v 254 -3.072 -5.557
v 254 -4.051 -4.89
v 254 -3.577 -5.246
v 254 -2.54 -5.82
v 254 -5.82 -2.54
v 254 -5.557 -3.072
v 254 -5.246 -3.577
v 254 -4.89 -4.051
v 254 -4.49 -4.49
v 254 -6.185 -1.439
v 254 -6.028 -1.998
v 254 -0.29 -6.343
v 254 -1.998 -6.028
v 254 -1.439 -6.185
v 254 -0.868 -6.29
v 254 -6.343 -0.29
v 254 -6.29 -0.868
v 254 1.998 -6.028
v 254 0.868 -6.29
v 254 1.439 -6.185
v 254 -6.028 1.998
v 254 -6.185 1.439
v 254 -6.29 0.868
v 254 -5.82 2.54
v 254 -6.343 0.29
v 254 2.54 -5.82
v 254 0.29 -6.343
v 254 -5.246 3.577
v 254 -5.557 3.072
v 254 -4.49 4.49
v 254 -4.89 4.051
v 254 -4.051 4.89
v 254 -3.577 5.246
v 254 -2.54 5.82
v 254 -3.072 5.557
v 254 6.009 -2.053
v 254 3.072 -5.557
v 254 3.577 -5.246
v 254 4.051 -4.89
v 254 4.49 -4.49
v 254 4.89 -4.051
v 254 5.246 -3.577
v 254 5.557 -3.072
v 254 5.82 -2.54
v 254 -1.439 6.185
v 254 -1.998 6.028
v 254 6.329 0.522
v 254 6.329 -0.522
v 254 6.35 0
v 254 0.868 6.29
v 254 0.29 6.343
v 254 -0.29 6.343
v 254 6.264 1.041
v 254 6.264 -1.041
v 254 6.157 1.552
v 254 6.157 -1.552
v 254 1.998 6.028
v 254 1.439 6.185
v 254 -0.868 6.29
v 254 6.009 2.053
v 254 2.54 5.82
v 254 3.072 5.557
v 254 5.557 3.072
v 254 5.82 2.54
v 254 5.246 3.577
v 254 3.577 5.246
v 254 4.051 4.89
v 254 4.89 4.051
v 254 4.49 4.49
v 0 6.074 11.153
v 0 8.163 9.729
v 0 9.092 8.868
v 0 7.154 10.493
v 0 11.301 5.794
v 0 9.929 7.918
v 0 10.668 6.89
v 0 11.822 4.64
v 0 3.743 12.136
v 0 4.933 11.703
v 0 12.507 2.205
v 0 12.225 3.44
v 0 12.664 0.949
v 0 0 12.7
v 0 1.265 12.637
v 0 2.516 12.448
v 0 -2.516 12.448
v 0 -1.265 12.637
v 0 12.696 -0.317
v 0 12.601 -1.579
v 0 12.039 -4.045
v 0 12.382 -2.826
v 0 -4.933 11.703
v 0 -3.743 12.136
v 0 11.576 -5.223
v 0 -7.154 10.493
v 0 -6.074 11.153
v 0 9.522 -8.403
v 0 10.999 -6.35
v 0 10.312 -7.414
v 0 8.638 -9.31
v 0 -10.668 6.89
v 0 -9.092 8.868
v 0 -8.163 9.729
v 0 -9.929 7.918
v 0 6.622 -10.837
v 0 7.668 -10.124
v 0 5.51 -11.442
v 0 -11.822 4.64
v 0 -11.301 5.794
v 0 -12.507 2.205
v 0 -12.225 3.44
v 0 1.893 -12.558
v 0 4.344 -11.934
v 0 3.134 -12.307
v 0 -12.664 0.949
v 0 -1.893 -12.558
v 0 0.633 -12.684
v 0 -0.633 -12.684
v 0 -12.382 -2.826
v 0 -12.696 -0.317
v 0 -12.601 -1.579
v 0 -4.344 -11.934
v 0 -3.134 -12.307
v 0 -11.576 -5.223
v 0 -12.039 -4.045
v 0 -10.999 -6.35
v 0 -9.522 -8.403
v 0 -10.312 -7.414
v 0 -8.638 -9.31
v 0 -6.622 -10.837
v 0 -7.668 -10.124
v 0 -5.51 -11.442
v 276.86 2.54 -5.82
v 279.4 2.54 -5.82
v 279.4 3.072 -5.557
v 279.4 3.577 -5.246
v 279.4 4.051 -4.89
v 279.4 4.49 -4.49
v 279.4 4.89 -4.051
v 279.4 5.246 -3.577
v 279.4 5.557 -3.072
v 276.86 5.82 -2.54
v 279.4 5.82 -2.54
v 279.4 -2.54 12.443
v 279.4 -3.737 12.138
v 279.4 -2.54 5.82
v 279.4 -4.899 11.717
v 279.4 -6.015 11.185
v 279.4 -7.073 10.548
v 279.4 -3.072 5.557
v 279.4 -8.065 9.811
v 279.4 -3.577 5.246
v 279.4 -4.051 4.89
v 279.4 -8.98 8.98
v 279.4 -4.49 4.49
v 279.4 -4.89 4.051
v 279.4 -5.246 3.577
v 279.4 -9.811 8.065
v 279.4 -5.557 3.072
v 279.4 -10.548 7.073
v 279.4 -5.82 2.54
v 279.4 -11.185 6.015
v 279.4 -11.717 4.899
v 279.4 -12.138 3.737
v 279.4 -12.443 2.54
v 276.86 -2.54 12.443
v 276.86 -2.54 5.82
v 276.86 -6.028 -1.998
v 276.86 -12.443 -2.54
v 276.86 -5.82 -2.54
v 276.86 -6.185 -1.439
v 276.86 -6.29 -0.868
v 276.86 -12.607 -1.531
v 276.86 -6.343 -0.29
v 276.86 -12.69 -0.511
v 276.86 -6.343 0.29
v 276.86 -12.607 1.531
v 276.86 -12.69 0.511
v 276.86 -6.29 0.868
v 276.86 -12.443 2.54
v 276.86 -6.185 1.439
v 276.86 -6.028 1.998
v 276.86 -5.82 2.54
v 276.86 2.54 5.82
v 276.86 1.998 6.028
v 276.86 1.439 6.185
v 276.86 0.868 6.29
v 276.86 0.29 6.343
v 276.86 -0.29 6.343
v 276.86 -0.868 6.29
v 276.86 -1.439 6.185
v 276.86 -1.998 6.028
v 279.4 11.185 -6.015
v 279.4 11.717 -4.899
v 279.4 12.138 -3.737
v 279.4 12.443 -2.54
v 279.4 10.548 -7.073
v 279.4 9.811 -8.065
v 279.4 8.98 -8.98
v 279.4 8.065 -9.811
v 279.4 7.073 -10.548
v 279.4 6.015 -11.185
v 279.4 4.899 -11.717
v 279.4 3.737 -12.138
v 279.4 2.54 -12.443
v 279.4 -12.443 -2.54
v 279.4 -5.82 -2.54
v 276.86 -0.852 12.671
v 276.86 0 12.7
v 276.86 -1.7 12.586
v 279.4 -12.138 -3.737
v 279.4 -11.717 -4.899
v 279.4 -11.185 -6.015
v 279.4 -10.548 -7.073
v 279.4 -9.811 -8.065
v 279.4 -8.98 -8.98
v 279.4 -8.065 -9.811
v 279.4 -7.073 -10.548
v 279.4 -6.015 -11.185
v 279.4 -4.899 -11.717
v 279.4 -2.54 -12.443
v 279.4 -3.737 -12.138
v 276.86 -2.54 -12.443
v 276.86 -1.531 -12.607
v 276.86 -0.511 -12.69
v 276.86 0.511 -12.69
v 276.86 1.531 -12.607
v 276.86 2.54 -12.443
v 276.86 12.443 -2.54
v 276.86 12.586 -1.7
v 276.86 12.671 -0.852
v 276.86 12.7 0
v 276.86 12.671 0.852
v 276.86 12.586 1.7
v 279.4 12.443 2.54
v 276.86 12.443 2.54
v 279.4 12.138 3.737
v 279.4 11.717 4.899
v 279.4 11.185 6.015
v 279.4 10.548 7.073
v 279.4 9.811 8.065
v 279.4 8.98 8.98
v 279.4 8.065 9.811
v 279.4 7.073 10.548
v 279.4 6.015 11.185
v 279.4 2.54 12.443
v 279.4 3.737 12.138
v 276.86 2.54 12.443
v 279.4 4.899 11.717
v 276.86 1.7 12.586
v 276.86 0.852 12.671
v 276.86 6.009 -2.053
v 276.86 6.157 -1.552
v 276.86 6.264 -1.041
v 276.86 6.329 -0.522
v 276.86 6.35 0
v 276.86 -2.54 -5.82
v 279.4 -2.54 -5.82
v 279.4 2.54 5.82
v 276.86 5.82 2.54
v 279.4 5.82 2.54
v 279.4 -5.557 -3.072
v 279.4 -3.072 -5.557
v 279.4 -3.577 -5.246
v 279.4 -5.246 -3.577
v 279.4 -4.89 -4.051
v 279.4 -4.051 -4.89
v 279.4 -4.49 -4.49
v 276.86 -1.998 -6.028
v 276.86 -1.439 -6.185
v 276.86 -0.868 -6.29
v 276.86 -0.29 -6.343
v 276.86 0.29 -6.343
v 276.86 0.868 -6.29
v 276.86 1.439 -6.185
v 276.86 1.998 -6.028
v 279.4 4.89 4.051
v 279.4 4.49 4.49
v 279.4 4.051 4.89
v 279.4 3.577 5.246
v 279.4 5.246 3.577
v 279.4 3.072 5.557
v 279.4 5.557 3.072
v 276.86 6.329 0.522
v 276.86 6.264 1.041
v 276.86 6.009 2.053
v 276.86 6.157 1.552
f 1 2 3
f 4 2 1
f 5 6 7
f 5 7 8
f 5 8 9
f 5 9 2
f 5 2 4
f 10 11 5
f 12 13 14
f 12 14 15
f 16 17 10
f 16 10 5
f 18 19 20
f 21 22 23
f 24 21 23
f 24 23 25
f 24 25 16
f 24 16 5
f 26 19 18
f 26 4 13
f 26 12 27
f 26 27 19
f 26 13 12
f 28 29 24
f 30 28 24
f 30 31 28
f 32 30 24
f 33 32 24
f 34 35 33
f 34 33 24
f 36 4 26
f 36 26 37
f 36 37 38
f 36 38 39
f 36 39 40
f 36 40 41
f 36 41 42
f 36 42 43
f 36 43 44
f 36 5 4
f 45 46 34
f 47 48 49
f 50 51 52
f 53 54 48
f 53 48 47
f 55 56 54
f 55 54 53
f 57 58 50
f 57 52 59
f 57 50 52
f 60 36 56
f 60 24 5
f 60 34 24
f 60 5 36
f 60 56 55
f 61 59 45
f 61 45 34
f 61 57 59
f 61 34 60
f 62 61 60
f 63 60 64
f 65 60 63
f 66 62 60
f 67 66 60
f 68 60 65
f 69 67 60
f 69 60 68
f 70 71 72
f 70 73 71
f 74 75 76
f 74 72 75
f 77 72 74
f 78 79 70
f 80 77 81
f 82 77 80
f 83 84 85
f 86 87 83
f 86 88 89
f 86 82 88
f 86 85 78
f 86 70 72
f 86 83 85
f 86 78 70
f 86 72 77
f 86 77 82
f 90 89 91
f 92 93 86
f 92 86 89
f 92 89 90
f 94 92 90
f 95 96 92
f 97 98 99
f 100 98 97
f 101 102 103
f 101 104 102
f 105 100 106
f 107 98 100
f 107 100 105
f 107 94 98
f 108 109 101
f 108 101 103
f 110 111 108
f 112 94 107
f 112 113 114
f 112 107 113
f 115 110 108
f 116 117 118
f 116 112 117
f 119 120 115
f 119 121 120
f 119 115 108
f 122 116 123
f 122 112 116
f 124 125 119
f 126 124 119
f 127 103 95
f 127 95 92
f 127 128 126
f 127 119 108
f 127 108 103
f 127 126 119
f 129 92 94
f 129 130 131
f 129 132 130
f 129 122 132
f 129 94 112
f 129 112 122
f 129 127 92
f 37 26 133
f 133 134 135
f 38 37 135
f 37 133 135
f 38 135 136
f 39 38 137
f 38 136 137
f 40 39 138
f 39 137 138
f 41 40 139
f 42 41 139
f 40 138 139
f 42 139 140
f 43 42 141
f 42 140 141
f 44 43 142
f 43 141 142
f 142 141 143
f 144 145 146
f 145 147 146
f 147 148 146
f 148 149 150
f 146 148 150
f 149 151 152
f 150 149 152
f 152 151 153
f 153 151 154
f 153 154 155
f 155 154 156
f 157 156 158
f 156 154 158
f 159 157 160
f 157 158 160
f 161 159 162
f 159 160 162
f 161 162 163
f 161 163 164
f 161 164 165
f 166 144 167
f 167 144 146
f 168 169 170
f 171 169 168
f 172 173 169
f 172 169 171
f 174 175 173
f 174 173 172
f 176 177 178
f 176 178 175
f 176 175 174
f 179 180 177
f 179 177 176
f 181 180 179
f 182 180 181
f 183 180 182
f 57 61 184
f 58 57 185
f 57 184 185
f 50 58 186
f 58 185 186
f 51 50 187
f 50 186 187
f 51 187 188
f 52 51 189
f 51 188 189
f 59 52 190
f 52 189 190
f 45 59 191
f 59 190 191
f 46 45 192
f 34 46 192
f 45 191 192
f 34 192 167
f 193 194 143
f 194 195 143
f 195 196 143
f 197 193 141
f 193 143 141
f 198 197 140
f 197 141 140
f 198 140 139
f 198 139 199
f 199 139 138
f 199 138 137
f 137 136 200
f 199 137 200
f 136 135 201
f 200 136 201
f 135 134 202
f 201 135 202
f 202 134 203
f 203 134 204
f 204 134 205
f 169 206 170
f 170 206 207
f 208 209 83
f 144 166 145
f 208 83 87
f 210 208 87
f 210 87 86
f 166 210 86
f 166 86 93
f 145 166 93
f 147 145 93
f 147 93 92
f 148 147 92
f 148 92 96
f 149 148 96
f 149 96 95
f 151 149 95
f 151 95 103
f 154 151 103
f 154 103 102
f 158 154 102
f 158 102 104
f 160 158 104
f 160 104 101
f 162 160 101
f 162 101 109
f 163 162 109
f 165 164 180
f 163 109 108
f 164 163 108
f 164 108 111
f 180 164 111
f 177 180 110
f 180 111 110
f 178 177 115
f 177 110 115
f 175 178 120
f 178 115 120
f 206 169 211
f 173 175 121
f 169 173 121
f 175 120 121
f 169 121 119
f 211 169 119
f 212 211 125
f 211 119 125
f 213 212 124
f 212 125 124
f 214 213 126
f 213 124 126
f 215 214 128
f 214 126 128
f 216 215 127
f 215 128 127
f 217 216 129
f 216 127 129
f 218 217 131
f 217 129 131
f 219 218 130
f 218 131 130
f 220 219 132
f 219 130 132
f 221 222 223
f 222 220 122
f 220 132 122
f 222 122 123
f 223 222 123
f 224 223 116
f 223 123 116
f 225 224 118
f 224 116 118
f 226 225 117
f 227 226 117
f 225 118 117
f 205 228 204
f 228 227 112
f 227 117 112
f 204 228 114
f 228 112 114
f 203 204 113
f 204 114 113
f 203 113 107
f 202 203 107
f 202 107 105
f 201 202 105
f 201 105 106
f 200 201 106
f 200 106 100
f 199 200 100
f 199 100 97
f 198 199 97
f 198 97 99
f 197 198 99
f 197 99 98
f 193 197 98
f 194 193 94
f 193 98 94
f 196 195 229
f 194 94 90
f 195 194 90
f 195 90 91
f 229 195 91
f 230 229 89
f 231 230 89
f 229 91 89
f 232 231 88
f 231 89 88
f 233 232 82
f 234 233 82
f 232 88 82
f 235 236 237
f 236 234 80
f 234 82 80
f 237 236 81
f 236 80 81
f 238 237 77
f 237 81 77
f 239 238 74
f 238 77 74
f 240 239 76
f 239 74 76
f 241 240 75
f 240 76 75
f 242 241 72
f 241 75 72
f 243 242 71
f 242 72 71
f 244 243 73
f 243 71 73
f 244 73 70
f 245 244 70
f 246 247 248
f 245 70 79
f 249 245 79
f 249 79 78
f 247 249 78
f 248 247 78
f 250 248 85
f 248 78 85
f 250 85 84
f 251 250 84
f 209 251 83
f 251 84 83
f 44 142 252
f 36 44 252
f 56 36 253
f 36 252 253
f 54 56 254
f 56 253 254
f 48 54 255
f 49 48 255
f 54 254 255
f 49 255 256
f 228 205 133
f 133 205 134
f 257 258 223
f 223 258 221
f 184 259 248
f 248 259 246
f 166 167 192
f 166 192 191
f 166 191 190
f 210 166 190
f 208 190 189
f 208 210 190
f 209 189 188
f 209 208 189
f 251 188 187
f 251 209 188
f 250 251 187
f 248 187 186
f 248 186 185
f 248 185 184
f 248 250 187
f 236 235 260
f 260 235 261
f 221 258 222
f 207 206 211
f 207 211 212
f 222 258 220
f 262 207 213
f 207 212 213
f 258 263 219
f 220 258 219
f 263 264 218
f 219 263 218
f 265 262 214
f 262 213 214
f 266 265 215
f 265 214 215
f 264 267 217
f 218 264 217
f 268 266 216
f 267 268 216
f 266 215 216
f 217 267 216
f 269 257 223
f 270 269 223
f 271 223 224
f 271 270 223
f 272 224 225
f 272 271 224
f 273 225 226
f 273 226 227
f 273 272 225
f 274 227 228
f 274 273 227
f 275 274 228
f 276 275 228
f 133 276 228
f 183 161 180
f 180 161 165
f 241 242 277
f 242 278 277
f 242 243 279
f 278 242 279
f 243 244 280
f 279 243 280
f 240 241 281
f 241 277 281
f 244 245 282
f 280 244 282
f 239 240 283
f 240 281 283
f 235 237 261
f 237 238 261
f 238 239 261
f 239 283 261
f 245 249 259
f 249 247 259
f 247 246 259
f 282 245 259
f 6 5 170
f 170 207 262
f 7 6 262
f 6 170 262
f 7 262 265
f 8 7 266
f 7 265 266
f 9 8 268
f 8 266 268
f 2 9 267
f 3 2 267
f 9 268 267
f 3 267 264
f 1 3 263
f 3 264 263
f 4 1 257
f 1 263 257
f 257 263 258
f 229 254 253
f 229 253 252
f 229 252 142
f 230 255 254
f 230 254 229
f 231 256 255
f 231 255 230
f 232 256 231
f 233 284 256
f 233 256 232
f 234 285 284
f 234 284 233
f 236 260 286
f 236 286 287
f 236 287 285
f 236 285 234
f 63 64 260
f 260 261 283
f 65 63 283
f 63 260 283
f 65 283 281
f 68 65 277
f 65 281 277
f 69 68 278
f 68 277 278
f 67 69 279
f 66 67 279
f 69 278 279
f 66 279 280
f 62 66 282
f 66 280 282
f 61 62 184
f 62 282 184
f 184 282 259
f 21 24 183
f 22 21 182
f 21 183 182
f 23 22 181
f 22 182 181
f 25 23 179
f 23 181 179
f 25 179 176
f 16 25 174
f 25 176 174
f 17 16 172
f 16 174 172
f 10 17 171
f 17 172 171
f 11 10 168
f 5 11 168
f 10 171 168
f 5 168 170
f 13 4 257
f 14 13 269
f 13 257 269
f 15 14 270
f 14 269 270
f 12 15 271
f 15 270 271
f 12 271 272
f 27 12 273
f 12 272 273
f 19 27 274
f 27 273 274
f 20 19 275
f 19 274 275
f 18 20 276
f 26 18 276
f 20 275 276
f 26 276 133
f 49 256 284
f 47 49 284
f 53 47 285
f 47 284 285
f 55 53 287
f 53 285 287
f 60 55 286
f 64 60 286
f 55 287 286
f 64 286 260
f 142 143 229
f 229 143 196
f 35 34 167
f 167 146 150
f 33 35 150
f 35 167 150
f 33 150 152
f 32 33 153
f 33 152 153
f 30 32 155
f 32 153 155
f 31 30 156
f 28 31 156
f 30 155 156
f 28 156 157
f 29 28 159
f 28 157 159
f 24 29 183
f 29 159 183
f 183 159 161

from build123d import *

# Parameters (mm, degrees)
F0_W     = 66.167
F0_H     = 12.7
F0_W_2   = 194.183
F0_W_3   = 19.05
F3_DEPTH = 2.54
F4_DEPTH = 25.4


with BuildPart() as f1:
    # F0 (on Front) → F1 (revolve)
    with BuildSketch(Plane.XZ):
        with Locations((33.0835, 6.35)):
            Rectangle(F0_W, F0_H)
        with Locations((163.2585, 6.35)):
            Rectangle(F0_W_2, F0_H)
        with Locations((269.875, 6.35)):
            Rectangle(F0_W_3, F0_H)
    revolve(axis=Axis((155.896521, 0, 0), (1, 0, 0)))

    # F2 (on face) → F3 (cut)
    with BuildSketch(Plane.YZ.offset(279.4)):
        with BuildLine():
            ThreePointArc((-2.54, 5.819871), (0, 6.35), (2.54, 5.819871))
            Line((2.54, 5.819871), (2.54, 12.443408))
            ThreePointArc((2.54, 12.443408), (0, 12.7), (-2.54, 12.443408))
            Line((-2.54, 12.443408), (-2.54, 5.819871))
        make_face()
        with BuildLine():
            ThreePointArc((-5.819871, -2.54), (-6.35, 0), (-5.819871, 2.54))
            Line((-5.819871, 2.54), (-12.443408, 2.54))
            ThreePointArc((-12.443408, 2.54), (-12.7, 0), (-12.443408, -2.54))
            Line((-12.443408, -2.54), (-5.819871, -2.54))
        make_face()
        with BuildLine():
            Line((2.54, -12.443408), (2.54, -5.819871))
            ThreePointArc((2.54, -5.819871), (0, -6.35), (-2.54, -5.819871))
            Line((-2.54, -5.819871), (-2.54, -12.443408))
            ThreePointArc((-2.54, -12.443408), (0, -12.7), (2.54, -12.443408))
        make_face()
        with BuildLine():
            ThreePointArc((5.819871, 2.54), (6.216055, 1.297366), (6.35, 0))
            ThreePointArc((6.35, 0), (6.216055, -1.297366), (5.819871, -2.54))
            Line((5.819871, -2.54), (12.443408, -2.54))
            ThreePointArc((12.443408, -2.54), (12.635689, -1.276464), (12.7, 0))
            ThreePointArc((12.7, 0), (12.635689, 1.276464), (12.443408, 2.54))
            Line((12.443408, 2.54), (5.819871, 2.54))
        make_face()
    extrude(amount=-F3_DEPTH, mode=Mode.SUBTRACT)

    # F2 (on face) → F4 (cut)
    with BuildSketch(Plane.YZ.offset(279.4)):
        with BuildLine():
            ThreePointArc((5.819871, -2.54), (6.216055, -1.297366), (6.35, 0))
            ThreePointArc((6.35, 0), (6.216055, 1.297366), (5.819871, 2.54))
            ThreePointArc((5.819871, 2.54), (4.490128, 4.490128), (2.54, 5.819871))
            ThreePointArc((2.54, 5.819871), (0, 6.35), (-2.54, 5.819871))
            ThreePointArc((-2.54, 5.819871), (-4.490128, 4.490128), (-5.819871, 2.54))
            ThreePointArc((-5.819871, 2.54), (-6.35, 0), (-5.819871, -2.54))
            ThreePointArc((-5.819871, -2.54), (-4.490128, -4.490128), (-2.54, -5.819871))
            ThreePointArc((-2.54, -5.819871), (0, -6.35), (2.54, -5.819871))
            ThreePointArc((2.54, -5.819871), (4.490128, -4.490128), (5.819871, -2.54))
        make_face()
    extrude(amount=-F4_DEPTH, mode=Mode.SUBTRACT)


solid = f1.part
